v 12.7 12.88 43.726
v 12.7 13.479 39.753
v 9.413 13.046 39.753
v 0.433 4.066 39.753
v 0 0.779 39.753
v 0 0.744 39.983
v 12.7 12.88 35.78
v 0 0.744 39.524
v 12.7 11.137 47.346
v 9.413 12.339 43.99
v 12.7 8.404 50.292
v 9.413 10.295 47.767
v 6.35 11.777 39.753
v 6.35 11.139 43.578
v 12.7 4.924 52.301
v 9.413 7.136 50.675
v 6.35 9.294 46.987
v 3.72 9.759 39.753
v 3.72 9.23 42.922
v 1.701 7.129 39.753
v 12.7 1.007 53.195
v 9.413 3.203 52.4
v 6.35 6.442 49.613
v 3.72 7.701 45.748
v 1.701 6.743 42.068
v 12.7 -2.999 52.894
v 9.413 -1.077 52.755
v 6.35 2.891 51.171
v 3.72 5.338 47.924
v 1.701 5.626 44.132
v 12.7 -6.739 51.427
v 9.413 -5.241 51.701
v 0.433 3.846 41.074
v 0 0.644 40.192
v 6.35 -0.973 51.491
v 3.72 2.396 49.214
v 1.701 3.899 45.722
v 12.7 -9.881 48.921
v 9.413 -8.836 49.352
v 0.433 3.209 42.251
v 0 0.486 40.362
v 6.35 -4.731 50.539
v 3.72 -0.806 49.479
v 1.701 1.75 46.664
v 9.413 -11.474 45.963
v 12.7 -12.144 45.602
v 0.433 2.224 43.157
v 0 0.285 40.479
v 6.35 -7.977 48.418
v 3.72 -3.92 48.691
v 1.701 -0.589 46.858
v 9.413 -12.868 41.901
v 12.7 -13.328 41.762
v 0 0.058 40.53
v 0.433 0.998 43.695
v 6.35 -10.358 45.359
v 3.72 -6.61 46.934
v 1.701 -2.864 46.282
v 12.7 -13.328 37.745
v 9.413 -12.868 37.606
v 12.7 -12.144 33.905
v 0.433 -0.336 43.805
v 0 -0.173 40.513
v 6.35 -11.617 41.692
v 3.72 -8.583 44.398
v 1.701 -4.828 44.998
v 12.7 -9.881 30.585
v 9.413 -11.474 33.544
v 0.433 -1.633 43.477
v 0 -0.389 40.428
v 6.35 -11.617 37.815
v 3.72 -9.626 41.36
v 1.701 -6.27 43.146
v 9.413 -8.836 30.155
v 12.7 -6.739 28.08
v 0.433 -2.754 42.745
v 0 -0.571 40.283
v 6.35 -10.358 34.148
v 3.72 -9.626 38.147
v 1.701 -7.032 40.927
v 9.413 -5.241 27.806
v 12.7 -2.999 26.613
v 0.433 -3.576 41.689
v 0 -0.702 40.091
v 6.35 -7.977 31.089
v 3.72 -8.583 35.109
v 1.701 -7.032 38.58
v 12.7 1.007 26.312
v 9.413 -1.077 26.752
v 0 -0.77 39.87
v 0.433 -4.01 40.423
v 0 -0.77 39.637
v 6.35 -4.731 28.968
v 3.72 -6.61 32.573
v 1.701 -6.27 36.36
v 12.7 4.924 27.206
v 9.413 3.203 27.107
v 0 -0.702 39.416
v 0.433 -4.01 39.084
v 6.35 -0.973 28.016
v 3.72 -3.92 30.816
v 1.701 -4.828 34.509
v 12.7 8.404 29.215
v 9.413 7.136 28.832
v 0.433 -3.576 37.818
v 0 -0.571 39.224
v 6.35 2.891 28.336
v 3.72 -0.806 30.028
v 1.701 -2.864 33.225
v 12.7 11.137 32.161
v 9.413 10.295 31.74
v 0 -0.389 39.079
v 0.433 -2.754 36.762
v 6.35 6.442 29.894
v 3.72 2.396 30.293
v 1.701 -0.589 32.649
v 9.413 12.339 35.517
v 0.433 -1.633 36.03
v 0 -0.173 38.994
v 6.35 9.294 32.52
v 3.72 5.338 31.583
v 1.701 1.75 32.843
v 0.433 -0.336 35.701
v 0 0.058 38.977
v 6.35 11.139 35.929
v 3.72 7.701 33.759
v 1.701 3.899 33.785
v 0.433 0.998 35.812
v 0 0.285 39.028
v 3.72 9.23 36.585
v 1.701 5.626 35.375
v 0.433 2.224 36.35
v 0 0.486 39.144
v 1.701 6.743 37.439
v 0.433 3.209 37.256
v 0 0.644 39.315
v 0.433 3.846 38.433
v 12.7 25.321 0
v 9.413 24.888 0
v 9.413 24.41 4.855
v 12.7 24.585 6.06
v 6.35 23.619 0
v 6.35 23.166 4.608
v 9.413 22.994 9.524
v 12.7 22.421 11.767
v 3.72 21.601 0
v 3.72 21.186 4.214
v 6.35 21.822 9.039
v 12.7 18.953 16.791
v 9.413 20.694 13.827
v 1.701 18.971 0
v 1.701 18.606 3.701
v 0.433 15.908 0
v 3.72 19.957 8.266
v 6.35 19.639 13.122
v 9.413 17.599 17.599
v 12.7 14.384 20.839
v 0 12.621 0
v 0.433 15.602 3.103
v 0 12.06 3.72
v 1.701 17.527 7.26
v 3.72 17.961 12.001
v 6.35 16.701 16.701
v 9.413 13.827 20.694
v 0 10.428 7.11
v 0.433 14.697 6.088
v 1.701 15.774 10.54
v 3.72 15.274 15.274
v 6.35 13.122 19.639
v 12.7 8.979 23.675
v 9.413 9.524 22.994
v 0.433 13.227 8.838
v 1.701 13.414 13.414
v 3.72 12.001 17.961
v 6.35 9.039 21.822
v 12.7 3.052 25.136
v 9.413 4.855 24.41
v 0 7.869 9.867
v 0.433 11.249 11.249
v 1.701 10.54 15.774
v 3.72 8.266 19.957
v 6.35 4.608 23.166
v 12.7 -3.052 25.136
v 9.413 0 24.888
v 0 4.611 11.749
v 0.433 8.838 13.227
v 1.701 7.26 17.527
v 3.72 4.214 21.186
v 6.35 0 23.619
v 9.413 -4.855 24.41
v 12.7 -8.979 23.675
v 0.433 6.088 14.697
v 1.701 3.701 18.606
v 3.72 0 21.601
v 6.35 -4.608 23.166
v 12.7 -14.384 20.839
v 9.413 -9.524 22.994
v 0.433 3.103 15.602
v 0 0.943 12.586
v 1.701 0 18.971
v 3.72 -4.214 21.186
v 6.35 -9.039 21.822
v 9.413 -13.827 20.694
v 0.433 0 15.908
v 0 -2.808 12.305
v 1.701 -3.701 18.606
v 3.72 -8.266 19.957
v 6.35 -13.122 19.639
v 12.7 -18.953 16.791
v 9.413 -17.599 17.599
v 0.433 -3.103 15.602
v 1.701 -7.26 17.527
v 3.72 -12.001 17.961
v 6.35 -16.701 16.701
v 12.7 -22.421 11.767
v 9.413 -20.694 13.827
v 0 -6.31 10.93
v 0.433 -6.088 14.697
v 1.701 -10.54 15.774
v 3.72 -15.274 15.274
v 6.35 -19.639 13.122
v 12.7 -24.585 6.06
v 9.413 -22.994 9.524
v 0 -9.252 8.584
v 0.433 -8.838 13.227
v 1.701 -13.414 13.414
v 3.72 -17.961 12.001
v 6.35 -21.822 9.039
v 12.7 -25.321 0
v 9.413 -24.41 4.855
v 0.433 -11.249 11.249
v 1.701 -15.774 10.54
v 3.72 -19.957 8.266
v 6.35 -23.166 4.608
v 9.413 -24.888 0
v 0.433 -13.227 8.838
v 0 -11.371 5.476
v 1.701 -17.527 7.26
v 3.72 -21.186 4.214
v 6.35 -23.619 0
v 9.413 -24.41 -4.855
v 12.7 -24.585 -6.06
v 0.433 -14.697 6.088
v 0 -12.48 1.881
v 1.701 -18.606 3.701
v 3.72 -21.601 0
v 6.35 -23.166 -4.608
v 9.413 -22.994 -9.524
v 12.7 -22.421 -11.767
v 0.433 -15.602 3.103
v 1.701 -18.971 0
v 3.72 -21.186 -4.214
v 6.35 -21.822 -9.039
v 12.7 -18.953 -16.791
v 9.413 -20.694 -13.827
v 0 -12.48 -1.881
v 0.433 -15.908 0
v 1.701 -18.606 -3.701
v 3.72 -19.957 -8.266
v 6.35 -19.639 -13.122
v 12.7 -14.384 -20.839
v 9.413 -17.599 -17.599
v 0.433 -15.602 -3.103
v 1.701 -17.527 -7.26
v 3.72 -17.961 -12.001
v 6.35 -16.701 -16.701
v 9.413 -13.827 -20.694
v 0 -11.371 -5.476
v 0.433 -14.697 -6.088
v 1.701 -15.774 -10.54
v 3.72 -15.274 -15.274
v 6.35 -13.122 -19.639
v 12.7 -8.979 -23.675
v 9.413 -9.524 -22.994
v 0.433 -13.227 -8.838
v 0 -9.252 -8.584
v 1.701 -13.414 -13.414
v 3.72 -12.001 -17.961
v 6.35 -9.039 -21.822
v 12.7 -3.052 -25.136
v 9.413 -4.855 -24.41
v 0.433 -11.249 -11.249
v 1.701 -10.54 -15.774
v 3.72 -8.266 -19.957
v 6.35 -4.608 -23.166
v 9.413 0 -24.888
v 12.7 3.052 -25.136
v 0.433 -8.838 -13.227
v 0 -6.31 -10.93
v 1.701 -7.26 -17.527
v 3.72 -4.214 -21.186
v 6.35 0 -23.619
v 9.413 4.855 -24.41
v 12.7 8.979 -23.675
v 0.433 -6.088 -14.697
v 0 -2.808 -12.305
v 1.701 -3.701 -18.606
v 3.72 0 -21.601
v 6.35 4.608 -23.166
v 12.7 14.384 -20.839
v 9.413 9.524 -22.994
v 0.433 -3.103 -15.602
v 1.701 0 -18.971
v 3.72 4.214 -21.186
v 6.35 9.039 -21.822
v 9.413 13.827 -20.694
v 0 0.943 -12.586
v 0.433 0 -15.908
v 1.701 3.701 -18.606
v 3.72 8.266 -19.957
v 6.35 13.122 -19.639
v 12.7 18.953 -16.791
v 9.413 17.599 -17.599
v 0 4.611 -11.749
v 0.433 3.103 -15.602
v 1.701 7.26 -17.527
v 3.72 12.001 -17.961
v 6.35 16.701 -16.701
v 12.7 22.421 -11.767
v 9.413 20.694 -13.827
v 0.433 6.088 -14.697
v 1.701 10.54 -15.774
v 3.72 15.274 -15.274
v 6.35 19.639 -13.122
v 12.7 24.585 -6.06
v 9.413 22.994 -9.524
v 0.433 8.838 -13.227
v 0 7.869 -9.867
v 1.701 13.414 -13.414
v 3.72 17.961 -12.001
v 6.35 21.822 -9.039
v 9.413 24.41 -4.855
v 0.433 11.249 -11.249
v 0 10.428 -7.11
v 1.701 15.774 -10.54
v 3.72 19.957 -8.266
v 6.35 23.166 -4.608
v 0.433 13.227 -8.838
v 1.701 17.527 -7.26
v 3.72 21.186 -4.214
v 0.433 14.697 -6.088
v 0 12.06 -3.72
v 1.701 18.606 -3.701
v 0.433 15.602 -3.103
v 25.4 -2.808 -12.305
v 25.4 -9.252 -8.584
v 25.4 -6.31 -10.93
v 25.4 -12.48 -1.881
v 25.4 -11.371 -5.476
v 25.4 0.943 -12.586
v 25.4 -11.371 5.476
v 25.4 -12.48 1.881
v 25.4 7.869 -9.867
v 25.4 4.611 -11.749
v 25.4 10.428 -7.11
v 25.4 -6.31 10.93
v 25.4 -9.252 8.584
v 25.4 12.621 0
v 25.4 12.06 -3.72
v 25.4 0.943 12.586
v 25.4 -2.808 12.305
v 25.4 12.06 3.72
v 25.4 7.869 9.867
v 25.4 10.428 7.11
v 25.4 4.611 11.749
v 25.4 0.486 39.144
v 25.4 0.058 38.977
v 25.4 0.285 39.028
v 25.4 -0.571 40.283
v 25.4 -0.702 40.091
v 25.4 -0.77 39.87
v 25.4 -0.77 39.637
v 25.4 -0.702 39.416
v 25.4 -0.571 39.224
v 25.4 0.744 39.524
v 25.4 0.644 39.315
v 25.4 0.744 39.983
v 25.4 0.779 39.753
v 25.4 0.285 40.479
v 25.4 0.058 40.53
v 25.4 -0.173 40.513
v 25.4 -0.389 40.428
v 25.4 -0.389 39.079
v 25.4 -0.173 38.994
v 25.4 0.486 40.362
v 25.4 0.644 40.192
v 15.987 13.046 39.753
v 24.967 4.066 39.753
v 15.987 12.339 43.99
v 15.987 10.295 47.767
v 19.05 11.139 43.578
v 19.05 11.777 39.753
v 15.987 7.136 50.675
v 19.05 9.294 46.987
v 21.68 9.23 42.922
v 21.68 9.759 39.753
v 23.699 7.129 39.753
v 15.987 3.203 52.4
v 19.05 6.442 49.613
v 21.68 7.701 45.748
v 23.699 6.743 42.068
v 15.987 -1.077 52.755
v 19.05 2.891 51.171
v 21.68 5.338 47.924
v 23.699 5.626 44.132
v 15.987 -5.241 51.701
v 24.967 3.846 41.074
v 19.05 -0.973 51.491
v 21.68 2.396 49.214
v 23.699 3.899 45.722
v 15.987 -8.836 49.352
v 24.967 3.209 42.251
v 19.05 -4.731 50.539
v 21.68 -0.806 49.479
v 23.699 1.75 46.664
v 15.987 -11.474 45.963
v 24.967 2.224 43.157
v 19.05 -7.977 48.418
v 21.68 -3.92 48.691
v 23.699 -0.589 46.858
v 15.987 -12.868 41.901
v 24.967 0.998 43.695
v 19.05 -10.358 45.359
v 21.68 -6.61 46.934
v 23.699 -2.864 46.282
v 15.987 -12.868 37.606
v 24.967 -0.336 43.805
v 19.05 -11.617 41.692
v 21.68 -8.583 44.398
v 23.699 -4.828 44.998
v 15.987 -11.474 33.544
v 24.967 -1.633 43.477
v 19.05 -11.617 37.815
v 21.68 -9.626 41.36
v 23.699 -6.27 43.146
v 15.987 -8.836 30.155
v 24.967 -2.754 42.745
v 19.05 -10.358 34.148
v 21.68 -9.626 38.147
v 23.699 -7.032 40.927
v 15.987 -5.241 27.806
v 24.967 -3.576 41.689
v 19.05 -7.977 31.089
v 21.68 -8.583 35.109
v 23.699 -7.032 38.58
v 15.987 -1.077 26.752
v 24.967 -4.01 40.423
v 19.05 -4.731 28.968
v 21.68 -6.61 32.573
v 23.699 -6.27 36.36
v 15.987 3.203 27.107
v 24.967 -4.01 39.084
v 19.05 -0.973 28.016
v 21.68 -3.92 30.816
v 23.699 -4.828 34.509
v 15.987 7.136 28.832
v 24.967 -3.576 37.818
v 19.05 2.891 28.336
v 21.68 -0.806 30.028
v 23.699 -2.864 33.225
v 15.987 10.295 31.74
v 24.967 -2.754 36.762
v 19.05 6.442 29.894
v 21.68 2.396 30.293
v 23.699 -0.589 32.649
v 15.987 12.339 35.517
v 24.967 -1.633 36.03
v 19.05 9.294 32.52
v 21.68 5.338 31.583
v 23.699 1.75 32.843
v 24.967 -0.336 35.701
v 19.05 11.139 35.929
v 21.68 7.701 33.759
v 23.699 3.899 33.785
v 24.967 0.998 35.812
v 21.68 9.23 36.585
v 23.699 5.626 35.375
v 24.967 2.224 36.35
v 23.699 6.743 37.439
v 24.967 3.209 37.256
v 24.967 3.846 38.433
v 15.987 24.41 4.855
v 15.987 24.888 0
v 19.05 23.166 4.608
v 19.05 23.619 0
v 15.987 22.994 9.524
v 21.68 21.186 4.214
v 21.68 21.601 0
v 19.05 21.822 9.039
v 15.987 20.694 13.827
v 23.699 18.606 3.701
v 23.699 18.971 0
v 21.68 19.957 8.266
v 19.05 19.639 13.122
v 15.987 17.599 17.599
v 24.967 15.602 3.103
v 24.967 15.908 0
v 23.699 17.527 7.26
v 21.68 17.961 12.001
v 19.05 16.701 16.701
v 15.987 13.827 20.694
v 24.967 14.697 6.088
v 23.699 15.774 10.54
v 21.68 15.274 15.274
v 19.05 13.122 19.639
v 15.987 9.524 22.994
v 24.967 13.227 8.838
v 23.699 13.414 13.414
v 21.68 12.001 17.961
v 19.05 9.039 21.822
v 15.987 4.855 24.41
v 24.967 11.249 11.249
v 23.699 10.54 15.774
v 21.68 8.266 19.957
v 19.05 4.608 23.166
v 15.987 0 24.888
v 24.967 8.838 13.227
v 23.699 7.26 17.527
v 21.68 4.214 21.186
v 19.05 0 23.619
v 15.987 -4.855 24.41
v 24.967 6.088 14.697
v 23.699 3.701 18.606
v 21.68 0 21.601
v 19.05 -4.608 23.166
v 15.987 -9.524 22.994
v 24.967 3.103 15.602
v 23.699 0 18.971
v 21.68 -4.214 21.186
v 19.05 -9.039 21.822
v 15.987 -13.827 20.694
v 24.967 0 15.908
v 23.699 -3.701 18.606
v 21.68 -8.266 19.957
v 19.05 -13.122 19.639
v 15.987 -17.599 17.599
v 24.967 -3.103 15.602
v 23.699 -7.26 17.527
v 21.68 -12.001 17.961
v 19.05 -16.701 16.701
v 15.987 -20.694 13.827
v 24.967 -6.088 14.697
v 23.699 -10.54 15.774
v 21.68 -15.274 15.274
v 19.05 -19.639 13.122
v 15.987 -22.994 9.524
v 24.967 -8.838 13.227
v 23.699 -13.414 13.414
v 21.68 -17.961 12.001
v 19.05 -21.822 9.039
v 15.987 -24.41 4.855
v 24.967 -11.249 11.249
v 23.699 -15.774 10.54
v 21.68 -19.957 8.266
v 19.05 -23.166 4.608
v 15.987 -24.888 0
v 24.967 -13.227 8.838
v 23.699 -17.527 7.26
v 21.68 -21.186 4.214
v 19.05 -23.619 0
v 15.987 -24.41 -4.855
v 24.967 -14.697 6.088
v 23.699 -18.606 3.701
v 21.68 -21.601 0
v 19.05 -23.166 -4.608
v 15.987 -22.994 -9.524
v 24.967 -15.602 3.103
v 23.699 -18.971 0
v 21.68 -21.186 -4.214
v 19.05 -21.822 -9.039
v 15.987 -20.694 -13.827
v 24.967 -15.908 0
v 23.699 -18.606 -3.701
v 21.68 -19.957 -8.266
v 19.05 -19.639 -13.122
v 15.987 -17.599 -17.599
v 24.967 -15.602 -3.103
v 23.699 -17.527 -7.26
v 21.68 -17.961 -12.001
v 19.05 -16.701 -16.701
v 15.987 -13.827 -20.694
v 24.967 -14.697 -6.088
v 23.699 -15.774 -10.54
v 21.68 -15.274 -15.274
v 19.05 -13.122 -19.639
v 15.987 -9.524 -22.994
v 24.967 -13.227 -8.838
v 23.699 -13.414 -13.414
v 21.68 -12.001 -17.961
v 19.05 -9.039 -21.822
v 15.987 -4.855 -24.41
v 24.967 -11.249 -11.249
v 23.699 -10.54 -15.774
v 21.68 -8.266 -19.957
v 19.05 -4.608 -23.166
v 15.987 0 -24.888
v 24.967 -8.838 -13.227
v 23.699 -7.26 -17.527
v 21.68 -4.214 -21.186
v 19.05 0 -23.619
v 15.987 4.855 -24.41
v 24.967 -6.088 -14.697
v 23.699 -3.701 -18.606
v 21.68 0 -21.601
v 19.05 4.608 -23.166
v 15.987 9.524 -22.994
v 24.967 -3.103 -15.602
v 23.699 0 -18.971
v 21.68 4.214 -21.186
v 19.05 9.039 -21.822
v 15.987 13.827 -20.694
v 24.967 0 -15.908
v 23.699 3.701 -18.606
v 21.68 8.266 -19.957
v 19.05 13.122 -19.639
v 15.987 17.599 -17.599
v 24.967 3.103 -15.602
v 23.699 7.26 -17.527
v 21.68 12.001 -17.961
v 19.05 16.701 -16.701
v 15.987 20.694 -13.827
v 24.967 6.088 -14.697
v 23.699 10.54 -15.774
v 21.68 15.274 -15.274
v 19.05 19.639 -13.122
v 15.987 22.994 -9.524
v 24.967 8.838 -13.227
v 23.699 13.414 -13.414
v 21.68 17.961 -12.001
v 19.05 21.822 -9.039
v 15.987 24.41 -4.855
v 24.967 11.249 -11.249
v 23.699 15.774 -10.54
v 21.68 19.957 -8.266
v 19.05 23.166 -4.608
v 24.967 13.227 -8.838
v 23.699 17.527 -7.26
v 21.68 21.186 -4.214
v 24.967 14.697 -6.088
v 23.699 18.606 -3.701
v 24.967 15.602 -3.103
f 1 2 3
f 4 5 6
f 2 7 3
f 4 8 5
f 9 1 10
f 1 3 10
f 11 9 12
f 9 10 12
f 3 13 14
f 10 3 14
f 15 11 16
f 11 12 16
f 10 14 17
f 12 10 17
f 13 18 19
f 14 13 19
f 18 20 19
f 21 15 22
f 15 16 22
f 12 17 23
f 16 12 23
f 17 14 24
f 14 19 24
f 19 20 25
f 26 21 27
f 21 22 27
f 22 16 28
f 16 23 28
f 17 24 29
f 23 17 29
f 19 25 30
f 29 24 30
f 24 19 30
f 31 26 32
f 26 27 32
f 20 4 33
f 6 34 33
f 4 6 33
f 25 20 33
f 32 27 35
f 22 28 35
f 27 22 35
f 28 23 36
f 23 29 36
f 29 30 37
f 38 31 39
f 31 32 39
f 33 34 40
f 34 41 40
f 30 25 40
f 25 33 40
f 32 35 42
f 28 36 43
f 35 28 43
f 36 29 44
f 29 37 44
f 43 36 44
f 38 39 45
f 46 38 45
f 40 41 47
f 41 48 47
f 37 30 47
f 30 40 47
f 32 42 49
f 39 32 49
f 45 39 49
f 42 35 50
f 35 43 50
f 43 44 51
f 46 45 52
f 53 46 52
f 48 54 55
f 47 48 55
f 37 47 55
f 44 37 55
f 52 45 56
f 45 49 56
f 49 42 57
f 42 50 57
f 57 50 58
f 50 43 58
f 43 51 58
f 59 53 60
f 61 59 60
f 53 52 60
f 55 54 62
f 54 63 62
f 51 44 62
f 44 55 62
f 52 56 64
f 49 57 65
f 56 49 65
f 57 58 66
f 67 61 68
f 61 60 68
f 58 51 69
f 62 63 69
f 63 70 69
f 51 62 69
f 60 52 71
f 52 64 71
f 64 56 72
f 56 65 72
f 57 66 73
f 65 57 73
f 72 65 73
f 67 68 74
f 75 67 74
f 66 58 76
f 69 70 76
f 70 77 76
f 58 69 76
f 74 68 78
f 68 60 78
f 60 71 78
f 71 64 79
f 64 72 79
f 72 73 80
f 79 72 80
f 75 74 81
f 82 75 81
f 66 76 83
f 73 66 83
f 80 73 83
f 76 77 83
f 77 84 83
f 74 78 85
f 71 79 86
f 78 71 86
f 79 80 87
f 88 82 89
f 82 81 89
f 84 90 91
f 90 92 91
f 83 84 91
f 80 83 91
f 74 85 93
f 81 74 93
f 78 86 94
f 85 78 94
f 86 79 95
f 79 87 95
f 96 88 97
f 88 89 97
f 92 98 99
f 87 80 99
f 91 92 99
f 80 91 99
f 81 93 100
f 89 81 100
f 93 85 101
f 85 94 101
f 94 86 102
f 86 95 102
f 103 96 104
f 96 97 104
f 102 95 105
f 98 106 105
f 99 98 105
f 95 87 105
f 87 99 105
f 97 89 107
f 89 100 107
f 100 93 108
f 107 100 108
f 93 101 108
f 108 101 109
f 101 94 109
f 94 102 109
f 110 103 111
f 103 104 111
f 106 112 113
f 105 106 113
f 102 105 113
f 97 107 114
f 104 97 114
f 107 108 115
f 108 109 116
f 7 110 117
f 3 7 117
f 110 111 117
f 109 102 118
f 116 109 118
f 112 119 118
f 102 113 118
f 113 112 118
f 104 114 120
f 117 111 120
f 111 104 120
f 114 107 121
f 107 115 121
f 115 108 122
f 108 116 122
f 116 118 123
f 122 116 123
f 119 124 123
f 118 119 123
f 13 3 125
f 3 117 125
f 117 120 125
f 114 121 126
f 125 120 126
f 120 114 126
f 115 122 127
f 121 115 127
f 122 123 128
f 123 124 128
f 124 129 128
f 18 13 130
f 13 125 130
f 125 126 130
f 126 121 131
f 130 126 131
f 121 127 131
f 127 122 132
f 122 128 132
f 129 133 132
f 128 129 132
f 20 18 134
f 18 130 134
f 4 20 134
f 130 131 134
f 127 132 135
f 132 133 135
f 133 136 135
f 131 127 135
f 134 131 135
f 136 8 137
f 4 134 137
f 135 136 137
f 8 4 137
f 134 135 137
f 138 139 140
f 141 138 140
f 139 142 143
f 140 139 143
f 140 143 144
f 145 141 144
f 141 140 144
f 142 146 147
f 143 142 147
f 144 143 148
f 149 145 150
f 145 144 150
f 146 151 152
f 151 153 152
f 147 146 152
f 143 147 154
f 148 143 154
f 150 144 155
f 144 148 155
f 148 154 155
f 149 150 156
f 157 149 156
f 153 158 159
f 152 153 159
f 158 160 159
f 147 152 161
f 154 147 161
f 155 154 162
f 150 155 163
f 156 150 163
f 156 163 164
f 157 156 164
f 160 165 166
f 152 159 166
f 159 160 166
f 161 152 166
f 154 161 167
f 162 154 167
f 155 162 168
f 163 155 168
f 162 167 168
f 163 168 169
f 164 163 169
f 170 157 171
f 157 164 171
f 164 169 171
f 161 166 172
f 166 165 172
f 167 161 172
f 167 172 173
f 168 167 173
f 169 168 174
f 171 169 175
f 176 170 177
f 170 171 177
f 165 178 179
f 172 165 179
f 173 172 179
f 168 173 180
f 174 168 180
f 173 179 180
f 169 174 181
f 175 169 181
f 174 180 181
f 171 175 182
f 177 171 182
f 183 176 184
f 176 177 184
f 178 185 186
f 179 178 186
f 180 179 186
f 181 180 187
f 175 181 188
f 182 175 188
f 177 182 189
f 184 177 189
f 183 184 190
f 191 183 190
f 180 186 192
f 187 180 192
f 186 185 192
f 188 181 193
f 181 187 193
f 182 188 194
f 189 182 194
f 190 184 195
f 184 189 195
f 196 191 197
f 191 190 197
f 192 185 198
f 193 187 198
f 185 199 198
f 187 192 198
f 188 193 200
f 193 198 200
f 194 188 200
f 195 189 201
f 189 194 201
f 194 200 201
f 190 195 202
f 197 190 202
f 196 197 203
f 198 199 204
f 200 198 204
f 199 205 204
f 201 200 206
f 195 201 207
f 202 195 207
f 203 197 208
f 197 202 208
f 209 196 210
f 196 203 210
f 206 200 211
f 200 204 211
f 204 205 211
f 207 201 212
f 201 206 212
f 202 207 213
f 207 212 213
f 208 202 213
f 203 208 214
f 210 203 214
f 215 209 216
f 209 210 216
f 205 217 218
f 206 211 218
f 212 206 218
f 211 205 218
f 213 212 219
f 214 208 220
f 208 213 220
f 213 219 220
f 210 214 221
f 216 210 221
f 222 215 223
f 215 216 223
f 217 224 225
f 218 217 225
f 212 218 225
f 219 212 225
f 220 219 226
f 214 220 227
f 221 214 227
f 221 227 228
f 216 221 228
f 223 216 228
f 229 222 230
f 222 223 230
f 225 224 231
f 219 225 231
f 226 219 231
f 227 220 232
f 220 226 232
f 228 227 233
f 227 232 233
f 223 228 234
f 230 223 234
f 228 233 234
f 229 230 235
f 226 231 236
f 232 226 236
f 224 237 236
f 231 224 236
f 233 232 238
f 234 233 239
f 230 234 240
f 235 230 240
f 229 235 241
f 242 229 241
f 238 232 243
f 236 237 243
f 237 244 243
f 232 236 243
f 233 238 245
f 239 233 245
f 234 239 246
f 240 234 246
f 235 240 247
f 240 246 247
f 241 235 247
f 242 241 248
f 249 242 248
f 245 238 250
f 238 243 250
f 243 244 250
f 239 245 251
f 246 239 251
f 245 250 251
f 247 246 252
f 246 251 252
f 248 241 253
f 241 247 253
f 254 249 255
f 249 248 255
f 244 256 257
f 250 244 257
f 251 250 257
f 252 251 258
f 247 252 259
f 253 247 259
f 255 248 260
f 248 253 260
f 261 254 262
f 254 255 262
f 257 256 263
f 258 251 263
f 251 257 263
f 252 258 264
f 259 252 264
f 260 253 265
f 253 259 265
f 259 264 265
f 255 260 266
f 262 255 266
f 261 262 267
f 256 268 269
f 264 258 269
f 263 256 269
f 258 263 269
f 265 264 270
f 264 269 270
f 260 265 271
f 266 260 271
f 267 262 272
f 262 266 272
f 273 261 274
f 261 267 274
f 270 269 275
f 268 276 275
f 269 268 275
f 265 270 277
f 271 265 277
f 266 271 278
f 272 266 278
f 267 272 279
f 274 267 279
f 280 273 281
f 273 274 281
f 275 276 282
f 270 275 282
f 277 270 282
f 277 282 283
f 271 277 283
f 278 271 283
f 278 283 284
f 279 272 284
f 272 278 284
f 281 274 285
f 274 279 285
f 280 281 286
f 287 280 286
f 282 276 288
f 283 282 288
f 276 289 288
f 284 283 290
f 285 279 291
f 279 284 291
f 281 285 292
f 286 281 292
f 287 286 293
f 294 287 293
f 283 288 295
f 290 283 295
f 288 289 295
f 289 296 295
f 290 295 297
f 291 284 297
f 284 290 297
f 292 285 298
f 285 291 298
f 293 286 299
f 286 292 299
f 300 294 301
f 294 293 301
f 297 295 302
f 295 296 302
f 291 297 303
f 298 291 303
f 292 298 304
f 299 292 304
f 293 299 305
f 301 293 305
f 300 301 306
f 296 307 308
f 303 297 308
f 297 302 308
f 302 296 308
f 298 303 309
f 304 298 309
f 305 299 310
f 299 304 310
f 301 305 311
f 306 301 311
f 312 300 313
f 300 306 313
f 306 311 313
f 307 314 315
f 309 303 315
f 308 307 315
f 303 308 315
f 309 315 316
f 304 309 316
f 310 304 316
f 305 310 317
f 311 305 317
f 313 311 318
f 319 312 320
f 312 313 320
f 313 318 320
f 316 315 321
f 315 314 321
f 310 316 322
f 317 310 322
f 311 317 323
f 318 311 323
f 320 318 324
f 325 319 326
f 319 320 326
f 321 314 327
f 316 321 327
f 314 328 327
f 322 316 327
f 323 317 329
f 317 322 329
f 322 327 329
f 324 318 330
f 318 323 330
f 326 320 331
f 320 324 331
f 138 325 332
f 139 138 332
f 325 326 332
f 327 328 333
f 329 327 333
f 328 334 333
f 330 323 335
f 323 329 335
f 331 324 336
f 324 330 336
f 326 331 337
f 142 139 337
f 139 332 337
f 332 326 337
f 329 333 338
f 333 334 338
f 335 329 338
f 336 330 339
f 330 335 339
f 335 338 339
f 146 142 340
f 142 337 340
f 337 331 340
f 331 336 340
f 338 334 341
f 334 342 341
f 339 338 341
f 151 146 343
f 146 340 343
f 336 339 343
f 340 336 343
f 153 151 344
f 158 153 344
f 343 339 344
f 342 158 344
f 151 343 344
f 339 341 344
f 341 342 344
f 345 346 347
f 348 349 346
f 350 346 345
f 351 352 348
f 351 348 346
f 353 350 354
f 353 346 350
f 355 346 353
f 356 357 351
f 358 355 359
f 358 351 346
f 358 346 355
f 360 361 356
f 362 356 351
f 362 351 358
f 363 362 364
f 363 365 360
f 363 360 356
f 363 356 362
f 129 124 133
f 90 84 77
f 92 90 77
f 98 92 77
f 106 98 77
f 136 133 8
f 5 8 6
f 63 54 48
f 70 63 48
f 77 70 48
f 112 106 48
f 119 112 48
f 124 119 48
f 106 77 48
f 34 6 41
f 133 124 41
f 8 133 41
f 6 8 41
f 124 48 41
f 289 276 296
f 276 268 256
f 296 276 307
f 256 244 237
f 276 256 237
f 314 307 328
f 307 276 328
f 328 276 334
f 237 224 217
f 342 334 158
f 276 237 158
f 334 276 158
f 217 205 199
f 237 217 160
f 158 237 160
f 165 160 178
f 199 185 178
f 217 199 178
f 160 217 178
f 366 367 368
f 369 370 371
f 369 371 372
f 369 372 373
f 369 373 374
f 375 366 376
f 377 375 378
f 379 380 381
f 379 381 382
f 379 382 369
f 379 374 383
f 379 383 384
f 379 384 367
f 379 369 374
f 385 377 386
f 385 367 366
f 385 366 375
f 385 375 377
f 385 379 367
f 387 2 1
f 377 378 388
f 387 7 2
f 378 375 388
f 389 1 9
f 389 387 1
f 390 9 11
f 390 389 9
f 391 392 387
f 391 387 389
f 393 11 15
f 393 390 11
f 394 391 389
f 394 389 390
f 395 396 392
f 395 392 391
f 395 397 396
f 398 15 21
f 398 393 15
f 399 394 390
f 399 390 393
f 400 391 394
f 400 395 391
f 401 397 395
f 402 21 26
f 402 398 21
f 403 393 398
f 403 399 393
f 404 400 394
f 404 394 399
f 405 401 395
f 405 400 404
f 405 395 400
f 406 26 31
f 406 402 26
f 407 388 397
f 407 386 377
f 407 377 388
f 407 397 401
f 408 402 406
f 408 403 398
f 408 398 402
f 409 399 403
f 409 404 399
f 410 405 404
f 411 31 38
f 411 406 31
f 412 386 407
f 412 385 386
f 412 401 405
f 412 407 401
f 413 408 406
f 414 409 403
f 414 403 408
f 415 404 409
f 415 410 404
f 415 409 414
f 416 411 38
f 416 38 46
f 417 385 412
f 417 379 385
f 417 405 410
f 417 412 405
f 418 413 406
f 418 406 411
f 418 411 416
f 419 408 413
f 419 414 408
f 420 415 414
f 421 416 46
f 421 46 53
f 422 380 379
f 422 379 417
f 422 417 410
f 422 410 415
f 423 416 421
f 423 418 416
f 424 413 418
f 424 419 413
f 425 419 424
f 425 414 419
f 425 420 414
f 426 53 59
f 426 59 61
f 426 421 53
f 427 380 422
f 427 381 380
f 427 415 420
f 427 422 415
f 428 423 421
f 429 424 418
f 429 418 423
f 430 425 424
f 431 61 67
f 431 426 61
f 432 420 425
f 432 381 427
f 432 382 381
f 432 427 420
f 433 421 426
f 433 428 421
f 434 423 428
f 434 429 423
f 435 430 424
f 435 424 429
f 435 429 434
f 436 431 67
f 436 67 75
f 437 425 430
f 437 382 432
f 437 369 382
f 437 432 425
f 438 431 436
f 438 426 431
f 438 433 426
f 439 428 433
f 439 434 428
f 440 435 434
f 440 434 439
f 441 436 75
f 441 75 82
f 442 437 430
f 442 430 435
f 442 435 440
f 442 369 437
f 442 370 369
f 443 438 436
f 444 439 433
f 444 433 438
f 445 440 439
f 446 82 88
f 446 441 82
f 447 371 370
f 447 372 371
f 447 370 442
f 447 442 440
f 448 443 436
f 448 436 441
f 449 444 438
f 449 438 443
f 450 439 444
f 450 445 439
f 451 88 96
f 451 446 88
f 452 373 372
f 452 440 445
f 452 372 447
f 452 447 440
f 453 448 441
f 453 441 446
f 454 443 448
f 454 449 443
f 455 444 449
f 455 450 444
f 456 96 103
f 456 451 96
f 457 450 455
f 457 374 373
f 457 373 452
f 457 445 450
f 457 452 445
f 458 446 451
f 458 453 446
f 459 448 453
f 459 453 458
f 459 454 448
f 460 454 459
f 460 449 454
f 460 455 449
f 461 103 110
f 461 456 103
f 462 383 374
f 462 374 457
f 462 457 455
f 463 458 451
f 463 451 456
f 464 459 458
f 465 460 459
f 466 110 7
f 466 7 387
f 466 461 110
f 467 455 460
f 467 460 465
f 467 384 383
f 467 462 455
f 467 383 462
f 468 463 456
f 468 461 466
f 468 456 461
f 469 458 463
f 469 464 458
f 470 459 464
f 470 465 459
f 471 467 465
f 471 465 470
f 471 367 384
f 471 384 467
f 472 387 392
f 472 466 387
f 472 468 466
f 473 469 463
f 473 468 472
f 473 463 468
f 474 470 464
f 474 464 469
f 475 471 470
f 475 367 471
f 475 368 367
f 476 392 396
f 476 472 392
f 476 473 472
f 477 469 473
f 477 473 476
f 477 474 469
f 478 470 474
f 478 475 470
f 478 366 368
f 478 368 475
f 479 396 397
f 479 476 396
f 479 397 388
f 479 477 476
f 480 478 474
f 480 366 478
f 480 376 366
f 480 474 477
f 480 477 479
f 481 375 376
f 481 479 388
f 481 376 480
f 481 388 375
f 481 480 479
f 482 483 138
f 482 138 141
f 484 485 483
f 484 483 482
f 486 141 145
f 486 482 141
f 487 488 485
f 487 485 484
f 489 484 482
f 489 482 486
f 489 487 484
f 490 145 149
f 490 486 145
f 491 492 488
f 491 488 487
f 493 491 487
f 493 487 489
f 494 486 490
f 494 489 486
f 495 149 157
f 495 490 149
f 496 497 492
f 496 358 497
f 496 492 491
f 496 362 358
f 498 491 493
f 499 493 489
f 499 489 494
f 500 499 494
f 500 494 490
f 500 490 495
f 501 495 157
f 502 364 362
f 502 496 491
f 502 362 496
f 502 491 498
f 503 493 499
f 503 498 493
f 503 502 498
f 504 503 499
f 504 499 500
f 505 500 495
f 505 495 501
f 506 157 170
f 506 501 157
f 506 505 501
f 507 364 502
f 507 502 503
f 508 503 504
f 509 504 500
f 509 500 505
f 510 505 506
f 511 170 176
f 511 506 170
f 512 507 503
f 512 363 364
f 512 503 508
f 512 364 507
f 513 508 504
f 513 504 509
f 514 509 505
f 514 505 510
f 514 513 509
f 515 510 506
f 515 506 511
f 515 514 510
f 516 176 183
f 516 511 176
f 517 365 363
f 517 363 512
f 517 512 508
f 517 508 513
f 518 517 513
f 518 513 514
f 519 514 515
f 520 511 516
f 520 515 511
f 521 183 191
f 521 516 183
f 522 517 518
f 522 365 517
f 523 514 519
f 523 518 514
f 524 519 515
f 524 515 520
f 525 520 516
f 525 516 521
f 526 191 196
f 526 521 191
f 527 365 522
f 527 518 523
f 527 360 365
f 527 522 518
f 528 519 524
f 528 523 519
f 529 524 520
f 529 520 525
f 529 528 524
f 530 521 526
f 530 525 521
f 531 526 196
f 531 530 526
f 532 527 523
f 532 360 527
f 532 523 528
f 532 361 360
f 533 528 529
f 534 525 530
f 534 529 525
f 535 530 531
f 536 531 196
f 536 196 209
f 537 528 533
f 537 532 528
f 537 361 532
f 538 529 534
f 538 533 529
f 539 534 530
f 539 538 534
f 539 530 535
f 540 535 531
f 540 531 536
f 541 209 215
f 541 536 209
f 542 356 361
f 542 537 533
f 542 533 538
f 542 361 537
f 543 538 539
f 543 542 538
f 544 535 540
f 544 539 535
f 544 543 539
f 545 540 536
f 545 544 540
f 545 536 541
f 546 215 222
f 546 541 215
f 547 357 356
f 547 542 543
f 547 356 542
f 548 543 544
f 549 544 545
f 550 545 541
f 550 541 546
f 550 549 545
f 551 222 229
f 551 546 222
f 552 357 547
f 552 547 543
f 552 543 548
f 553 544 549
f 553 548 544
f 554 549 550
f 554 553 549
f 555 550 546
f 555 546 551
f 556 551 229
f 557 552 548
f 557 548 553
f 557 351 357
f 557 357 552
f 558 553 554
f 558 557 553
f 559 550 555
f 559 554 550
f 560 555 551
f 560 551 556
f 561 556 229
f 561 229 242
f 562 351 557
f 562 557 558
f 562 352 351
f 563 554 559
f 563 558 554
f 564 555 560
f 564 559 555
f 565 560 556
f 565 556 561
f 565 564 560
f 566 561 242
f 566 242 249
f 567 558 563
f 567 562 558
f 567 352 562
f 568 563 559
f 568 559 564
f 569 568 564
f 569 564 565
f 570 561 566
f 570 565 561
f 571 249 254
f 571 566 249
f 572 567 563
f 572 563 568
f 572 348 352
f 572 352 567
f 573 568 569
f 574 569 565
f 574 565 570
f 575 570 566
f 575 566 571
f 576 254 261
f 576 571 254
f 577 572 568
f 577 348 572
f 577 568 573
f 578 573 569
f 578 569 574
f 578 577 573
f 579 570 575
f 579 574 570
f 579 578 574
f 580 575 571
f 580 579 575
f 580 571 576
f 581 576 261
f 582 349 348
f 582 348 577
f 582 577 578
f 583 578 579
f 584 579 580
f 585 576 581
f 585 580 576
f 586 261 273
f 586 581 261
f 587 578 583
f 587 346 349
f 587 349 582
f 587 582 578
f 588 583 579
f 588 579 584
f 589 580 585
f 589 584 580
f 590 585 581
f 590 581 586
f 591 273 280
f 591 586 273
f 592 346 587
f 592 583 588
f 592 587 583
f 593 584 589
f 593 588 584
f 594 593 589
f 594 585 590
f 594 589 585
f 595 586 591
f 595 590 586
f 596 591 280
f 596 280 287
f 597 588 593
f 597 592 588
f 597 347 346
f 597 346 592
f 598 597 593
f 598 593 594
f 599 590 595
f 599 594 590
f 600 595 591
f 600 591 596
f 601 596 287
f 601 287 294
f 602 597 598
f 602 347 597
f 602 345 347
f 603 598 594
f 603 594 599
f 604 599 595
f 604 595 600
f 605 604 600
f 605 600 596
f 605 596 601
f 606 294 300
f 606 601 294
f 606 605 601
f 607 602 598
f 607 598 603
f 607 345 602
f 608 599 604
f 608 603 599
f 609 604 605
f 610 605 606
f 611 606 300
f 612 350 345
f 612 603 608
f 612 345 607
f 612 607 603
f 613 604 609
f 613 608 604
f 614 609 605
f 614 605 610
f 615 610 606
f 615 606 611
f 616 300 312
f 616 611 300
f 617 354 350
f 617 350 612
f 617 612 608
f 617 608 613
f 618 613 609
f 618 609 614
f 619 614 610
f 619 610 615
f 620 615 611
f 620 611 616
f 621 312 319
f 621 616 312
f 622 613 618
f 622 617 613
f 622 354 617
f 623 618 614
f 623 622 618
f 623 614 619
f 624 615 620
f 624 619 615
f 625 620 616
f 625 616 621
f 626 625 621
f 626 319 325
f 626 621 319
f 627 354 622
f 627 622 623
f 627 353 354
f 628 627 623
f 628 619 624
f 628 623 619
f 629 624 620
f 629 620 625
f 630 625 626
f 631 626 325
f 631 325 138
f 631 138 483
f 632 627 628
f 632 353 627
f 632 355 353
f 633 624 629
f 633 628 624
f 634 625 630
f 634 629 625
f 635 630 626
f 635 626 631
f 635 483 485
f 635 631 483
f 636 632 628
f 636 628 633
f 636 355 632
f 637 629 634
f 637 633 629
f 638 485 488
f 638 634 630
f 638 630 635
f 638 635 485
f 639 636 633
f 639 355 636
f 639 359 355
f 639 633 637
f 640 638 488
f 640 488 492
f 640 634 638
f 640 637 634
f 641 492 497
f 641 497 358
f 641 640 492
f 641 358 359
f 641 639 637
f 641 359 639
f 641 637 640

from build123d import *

# Parameters (mm, degrees)
F0_R     = 25.3209330863
F1_DEPTH = 25.4
F2_R     = 12.69999
F3_R     = 13.4789007608
F4_DEPTH = 25.4
F5_R     = 12.69999


# Not quite as in the source:
# - a fillet or chamfer is up to 0.001 mm smaller than in the source, because OpenCascade refuses the exact size


with BuildPart() as f1:
    # F0 (on Right) → F1 (new body)
    with BuildSketch(Plane.YZ):
        Circle(F0_R)
    extrude(amount=F1_DEPTH)

    # F2 (radius 12.7 in the source; OpenCascade refuses exactly that, so slightly less here)
    f2_edges = [f1.edges().sort_by_distance(p)[0] for p in [
        (12.7, 25.320933, 0),
        (0, -25.320933, 0),
        (25.4, -25.320933, 0),
    ]]
    fillet(f2_edges, radius=F2_R)


with BuildPart() as f4:
    # F3 (on Right) → F4 (new body)
    with BuildSketch(Plane.YZ):
        with Locations((0, 39.7534705698)):
            Circle(F3_R)
    extrude(amount=F4_DEPTH)

    # F5 (radius 12.7 in the source; OpenCascade refuses exactly that, so slightly less here)
    f5_edges = [f4.edges().sort_by_distance(p)[0] for p in [
        (12.7, 13.478901, 39.753471),
        (0, -13.478901, 39.753471),
        (25.4, -13.478901, 39.753471),
    ]]
    fillet(f5_edges, radius=F5_R)


solid = Compound([f1.part, f4.part])
